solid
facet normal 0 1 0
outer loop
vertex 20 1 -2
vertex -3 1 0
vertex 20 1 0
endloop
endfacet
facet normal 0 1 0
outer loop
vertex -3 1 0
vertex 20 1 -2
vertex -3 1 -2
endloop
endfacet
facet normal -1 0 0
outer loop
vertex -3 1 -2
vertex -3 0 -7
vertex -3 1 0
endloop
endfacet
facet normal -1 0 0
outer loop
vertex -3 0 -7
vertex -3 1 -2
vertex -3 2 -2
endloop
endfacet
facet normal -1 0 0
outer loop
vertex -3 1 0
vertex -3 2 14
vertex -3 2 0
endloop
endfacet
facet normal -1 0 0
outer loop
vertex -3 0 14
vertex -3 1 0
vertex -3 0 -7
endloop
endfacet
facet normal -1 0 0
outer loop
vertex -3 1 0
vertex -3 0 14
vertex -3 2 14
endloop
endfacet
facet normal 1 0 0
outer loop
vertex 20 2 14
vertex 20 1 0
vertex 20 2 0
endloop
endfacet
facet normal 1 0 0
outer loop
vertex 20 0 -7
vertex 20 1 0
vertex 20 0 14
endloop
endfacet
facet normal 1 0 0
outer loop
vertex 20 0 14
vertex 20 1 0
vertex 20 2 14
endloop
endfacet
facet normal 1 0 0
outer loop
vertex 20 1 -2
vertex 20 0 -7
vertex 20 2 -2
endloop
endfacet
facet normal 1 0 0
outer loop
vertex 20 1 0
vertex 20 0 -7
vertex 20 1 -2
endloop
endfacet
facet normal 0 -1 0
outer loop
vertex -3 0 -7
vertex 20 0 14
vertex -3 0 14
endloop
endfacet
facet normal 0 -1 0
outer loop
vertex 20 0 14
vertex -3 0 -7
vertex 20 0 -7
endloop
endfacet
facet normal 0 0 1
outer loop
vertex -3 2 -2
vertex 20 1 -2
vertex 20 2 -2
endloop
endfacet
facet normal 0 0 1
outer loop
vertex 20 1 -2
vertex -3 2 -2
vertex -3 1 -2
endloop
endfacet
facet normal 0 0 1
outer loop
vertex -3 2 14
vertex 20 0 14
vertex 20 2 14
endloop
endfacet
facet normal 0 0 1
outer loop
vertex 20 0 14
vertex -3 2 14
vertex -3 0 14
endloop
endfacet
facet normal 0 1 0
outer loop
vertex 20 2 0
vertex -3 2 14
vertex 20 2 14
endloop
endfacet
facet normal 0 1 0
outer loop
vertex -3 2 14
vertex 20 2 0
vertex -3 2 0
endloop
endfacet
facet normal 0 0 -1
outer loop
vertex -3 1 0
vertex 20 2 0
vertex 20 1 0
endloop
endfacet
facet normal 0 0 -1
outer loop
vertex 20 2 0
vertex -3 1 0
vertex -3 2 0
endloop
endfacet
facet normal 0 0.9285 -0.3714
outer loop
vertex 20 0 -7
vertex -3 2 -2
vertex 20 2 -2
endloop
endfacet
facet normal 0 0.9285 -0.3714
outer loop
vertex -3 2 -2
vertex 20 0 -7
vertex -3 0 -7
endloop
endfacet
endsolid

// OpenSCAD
module hook(arm_length=1, arm_thickness=16, hook_length=5, hook_thickness=2, hook_width=23, gap_size=2) {
    // Arm
    translate([0, -arm_thickness, 0])
    cube([arm_length, arm_thickness, hook_width]);

    // Small block
    translate([0, -16, 0])
    cube([2, 16-gap_size, hook_width]);

    // Hook
    translate([0, 0, 0])
    linear_extrude(height = hook_width)
    polygon([[0, hook_length], [0, 0], [hook_thickness, 0]]);
}

// Wrapper module that applies transformations
module mounted_hook(gap_size=2) {
    translate([20, 0, -2])
    rotate([90, 180, 270])
    hook(gap_size=2);
}

// Call the new module
mounted_hook(gap_size=2);
